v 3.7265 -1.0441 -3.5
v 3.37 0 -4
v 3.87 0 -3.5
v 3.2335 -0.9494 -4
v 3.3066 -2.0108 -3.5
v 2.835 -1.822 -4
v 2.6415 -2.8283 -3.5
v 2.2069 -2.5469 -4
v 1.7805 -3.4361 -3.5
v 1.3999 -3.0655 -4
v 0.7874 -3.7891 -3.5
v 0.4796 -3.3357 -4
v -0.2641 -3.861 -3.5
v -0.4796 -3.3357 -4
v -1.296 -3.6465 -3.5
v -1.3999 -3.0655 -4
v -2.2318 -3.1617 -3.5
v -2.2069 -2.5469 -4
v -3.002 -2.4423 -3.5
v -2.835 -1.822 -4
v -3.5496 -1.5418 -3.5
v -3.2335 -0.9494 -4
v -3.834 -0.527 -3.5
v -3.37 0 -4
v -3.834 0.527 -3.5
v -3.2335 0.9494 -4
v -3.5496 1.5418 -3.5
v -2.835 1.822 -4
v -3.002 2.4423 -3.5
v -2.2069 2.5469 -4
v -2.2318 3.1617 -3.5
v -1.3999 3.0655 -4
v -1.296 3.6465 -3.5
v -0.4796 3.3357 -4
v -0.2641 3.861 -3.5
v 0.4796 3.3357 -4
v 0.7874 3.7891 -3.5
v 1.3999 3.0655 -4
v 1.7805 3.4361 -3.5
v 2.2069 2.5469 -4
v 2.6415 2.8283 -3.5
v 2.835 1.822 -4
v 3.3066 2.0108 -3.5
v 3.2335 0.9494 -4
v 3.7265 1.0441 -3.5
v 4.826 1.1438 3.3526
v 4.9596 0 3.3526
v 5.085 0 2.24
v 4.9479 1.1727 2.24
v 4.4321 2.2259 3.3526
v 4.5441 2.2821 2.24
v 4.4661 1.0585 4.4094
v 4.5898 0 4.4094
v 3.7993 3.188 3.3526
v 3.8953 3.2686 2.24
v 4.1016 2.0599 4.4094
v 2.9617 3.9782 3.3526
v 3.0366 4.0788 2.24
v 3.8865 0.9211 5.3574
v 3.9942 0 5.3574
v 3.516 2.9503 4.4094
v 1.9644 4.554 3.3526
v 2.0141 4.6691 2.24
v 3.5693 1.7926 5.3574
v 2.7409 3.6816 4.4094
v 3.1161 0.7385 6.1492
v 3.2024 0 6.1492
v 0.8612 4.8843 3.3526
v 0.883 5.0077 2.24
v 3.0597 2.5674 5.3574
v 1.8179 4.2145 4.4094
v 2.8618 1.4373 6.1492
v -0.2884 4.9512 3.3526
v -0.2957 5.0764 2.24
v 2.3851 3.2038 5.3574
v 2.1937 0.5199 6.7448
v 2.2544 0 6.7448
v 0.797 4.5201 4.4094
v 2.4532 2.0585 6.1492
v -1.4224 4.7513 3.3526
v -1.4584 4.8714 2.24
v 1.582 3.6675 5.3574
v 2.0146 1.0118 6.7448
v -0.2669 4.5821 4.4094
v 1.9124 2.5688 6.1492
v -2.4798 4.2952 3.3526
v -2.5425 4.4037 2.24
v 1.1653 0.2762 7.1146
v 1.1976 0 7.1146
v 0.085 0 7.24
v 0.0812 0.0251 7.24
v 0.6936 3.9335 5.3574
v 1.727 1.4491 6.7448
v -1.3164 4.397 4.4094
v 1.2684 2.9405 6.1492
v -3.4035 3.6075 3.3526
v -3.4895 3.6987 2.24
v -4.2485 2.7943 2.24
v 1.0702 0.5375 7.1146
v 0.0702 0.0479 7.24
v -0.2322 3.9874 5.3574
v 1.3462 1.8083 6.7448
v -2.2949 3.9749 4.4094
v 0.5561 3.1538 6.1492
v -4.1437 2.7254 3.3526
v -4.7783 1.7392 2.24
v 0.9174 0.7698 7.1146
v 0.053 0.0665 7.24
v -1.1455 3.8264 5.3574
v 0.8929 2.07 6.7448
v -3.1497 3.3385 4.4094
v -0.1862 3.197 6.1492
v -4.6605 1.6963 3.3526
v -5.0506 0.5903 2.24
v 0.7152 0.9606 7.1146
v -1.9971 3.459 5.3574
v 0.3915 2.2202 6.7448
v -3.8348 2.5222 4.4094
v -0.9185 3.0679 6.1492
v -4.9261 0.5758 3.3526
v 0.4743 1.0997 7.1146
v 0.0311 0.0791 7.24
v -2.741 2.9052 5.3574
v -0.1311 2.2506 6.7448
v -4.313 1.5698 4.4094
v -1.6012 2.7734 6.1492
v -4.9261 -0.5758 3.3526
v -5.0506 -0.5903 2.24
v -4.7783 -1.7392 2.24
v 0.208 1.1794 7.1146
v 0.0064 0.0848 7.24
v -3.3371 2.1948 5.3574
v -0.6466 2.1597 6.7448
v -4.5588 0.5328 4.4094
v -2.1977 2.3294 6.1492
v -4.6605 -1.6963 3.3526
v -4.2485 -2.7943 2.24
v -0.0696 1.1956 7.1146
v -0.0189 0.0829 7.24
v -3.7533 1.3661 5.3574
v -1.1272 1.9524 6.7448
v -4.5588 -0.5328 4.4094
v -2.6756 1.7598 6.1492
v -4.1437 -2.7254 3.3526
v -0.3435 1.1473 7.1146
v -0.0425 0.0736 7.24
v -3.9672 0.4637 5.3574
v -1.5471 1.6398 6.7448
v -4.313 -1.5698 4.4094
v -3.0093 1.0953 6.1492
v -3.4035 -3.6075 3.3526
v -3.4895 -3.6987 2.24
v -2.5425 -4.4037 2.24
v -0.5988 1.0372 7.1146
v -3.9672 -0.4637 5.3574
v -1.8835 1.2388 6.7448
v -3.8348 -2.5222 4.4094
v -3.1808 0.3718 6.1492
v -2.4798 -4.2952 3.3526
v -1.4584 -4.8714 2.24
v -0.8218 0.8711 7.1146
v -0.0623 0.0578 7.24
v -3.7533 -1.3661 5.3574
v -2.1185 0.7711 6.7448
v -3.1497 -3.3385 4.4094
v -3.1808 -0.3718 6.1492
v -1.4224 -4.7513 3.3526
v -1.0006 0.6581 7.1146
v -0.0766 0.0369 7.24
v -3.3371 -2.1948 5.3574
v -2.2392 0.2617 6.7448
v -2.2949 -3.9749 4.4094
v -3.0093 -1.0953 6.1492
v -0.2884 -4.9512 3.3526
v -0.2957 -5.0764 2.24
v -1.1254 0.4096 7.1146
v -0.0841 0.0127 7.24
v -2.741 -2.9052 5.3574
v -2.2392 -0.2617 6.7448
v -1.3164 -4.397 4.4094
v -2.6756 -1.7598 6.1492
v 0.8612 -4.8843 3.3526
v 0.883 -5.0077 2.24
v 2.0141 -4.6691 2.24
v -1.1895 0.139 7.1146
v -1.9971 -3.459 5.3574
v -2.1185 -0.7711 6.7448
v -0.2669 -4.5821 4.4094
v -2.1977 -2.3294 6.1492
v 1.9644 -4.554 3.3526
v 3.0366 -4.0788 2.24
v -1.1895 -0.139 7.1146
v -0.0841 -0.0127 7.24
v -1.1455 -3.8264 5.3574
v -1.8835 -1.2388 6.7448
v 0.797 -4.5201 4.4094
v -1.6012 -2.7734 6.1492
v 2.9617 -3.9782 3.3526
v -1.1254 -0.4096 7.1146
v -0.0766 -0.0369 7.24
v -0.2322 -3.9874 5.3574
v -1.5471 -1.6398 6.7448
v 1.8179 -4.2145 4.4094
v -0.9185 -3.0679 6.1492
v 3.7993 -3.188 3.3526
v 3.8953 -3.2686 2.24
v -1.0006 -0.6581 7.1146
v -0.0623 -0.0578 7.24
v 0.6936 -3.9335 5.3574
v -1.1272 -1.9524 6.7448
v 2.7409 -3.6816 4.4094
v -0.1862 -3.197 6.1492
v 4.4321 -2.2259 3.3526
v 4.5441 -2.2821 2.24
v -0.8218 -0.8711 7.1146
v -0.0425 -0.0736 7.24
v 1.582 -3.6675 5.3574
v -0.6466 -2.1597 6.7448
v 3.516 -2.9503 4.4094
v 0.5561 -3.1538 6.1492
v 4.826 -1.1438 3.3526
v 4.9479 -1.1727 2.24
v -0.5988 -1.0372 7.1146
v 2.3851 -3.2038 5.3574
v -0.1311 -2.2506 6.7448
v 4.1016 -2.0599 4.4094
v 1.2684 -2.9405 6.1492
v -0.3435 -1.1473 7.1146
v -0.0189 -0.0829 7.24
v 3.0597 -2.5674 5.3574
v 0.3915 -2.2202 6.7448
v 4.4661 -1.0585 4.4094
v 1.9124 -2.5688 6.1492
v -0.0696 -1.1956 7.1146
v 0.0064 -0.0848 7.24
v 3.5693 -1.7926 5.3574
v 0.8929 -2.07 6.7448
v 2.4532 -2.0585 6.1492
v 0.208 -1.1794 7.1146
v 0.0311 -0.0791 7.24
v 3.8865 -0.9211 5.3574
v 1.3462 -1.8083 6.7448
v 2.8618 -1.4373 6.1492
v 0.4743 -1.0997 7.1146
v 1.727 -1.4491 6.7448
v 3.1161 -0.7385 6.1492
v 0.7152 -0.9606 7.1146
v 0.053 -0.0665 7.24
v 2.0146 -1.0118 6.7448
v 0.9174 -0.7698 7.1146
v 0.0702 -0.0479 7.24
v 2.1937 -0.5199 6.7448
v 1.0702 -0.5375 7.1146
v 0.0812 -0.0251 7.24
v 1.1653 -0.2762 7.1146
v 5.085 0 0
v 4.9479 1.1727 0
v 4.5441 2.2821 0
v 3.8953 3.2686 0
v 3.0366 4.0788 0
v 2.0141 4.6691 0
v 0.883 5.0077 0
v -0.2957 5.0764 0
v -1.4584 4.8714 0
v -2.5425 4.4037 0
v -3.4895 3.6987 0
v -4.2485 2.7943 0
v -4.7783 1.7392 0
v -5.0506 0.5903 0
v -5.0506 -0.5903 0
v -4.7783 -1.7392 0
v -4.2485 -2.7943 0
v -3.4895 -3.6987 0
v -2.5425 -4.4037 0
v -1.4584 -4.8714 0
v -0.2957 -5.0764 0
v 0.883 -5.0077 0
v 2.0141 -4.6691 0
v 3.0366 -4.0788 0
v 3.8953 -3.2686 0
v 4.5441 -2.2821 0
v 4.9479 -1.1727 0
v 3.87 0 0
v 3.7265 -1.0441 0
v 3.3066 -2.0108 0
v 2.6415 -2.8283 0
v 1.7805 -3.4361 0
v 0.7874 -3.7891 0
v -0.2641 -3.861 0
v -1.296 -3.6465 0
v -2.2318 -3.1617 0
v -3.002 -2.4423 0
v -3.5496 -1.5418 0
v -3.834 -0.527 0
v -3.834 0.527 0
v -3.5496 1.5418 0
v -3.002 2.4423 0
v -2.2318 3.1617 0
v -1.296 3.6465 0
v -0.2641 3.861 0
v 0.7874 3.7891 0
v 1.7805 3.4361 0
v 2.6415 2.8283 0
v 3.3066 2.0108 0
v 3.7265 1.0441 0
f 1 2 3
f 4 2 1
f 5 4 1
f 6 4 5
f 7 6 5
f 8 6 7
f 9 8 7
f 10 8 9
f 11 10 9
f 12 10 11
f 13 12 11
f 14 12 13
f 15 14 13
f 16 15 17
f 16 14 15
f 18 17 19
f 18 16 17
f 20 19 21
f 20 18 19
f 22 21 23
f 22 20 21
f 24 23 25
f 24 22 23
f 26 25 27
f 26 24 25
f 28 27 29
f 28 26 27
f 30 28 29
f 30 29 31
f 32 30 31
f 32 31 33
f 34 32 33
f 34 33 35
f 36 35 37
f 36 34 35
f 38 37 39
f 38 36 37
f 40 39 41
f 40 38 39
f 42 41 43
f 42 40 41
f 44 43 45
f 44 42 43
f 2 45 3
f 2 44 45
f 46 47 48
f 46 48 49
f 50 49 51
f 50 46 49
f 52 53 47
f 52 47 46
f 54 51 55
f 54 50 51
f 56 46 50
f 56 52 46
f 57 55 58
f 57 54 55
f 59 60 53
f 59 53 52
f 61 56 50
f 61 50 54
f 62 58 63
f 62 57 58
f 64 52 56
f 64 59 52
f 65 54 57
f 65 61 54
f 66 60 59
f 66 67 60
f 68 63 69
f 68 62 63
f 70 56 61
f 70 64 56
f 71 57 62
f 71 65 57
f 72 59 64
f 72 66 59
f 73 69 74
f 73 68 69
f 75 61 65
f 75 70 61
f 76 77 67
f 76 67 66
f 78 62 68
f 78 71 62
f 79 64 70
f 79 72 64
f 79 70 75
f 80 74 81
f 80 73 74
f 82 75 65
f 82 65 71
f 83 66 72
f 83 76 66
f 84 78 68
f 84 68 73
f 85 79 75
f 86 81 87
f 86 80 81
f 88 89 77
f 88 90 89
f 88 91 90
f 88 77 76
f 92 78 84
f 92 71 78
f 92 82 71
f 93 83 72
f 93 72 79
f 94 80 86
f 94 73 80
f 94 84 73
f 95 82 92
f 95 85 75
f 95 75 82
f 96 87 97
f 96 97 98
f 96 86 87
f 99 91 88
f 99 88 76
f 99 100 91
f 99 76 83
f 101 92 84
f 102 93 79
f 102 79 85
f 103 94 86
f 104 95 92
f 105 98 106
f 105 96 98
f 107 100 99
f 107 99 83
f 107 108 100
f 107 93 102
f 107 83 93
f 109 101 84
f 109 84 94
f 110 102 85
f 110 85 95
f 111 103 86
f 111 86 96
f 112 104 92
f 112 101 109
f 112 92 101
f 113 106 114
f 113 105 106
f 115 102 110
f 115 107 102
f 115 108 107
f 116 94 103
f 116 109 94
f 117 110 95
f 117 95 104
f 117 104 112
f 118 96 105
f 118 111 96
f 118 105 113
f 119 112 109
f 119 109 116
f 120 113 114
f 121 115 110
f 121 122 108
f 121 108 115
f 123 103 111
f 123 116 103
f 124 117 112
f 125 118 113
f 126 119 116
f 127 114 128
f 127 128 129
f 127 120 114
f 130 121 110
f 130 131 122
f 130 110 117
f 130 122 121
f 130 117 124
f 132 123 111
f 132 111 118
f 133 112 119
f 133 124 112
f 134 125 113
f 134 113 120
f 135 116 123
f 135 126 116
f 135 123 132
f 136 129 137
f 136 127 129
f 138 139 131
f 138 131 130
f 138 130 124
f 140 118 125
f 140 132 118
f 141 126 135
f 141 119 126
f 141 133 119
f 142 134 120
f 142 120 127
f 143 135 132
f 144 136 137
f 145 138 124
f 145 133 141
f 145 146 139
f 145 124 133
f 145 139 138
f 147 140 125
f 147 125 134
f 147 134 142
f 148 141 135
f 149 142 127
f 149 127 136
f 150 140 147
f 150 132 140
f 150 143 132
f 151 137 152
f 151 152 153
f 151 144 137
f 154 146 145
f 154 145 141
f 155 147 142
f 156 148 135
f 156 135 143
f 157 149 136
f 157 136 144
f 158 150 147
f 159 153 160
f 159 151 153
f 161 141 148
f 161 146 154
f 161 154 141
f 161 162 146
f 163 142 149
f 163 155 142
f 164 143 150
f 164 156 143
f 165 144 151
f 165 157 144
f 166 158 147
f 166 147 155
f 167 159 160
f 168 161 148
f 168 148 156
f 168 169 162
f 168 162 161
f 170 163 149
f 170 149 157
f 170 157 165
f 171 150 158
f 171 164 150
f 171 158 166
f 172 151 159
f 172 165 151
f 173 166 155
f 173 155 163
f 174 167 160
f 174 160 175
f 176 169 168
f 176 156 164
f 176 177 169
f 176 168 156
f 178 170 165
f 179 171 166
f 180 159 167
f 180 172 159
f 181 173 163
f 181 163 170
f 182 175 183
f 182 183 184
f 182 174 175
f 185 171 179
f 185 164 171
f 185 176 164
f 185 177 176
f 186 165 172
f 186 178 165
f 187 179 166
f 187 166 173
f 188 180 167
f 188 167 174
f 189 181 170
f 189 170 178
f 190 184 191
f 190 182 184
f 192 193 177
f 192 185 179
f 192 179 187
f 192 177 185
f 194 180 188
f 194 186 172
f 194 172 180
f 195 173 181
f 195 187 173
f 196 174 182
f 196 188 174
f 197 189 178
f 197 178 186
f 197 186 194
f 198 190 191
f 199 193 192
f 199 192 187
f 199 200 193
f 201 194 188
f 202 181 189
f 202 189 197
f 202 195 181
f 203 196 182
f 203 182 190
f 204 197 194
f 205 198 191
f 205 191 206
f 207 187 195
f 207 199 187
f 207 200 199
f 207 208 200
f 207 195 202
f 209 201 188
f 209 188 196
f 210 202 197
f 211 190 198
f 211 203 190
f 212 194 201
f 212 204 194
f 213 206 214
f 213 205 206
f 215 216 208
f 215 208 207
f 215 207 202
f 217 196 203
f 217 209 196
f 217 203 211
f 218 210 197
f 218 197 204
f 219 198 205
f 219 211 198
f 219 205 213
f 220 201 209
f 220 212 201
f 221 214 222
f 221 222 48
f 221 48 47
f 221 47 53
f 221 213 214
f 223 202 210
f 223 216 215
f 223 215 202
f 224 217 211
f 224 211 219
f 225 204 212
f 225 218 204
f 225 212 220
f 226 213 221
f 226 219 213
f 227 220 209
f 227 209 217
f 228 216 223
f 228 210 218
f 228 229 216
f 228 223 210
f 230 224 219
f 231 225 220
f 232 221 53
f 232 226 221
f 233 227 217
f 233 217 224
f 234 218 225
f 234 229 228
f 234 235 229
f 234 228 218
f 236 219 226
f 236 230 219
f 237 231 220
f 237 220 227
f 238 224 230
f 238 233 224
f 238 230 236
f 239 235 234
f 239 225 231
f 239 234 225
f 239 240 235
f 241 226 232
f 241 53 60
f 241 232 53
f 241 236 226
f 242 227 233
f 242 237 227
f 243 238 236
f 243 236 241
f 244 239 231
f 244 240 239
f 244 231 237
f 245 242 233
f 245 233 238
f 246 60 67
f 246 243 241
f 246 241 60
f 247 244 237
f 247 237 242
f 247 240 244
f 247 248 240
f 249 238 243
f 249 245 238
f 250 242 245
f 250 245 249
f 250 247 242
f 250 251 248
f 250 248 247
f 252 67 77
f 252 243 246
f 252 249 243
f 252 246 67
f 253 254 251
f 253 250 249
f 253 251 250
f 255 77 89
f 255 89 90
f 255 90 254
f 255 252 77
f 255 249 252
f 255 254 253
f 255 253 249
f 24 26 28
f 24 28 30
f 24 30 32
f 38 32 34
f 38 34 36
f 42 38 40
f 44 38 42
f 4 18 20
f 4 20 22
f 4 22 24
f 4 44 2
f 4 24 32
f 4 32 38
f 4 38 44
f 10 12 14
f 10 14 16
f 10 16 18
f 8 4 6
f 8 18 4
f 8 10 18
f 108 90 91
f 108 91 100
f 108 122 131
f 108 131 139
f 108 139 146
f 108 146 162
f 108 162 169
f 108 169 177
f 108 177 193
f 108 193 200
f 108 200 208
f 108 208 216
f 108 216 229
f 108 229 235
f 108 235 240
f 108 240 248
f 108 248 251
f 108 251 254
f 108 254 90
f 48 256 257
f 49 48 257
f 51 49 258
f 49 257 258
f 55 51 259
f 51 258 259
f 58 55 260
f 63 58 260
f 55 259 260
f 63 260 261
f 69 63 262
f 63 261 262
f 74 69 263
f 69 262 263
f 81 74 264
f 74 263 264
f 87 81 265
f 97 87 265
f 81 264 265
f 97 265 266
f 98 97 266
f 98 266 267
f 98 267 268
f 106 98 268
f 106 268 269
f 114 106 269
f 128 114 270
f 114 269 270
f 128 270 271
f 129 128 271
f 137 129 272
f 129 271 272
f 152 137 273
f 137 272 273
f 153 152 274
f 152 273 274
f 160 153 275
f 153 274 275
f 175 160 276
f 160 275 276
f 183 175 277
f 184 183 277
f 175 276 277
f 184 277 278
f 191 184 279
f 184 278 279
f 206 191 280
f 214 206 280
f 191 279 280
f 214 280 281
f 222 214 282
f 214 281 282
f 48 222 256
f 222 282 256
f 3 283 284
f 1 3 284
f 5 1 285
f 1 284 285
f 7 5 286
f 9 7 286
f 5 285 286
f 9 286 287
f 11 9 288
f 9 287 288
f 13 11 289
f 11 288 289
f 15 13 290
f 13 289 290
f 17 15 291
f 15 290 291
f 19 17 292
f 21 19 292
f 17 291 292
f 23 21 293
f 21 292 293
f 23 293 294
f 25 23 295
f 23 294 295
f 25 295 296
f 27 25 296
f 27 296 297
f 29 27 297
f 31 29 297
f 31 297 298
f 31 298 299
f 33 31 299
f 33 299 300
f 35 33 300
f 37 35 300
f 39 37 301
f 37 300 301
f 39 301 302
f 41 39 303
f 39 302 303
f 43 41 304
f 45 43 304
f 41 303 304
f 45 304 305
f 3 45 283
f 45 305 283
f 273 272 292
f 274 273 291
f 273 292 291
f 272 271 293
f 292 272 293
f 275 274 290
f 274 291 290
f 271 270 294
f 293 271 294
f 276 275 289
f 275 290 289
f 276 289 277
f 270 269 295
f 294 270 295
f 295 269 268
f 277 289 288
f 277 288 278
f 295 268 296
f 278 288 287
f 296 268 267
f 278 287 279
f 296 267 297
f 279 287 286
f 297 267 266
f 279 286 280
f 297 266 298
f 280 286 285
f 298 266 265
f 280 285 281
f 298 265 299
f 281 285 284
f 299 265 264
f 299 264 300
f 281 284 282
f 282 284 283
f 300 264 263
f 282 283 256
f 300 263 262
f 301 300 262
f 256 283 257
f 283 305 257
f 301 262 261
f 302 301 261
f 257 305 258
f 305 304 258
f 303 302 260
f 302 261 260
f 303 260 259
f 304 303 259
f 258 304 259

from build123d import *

# Parameters (mm, degrees)
F0_R     = 5.085
F1_DEPTH = 7.24
F2_R     = 5
F3_R     = 3.87
F4_DEPTH = 4
F5_SIZE  = 0.5


with BuildPart() as f1:
    # F0 (on Top) → F1 (new body)
    with BuildSketch(Plane.XY):
        Circle(F0_R)
    extrude(amount=F1_DEPTH)

    # F2
    f2_edges = [f1.edges().sort_by_distance(p)[0] for p in [
        (-5.085, 0, 7.24),
    ]]
    fillet(f2_edges, radius=F2_R)

    # F3 (on face) → F4 (join)
    with BuildSketch(Plane(origin=(0, 0, 0), x_dir=(1, 0, 0), z_dir=(0, 0, -1))):
        Circle(F3_R)
    extrude(amount=F4_DEPTH)

    # F5
    f5_edges = [f1.edges().sort_by_distance(p)[0] for p in [
        (-3.87, 0, -4),
    ]]
    chamfer(f5_edges, length=F5_SIZE)


solid = f1.part
